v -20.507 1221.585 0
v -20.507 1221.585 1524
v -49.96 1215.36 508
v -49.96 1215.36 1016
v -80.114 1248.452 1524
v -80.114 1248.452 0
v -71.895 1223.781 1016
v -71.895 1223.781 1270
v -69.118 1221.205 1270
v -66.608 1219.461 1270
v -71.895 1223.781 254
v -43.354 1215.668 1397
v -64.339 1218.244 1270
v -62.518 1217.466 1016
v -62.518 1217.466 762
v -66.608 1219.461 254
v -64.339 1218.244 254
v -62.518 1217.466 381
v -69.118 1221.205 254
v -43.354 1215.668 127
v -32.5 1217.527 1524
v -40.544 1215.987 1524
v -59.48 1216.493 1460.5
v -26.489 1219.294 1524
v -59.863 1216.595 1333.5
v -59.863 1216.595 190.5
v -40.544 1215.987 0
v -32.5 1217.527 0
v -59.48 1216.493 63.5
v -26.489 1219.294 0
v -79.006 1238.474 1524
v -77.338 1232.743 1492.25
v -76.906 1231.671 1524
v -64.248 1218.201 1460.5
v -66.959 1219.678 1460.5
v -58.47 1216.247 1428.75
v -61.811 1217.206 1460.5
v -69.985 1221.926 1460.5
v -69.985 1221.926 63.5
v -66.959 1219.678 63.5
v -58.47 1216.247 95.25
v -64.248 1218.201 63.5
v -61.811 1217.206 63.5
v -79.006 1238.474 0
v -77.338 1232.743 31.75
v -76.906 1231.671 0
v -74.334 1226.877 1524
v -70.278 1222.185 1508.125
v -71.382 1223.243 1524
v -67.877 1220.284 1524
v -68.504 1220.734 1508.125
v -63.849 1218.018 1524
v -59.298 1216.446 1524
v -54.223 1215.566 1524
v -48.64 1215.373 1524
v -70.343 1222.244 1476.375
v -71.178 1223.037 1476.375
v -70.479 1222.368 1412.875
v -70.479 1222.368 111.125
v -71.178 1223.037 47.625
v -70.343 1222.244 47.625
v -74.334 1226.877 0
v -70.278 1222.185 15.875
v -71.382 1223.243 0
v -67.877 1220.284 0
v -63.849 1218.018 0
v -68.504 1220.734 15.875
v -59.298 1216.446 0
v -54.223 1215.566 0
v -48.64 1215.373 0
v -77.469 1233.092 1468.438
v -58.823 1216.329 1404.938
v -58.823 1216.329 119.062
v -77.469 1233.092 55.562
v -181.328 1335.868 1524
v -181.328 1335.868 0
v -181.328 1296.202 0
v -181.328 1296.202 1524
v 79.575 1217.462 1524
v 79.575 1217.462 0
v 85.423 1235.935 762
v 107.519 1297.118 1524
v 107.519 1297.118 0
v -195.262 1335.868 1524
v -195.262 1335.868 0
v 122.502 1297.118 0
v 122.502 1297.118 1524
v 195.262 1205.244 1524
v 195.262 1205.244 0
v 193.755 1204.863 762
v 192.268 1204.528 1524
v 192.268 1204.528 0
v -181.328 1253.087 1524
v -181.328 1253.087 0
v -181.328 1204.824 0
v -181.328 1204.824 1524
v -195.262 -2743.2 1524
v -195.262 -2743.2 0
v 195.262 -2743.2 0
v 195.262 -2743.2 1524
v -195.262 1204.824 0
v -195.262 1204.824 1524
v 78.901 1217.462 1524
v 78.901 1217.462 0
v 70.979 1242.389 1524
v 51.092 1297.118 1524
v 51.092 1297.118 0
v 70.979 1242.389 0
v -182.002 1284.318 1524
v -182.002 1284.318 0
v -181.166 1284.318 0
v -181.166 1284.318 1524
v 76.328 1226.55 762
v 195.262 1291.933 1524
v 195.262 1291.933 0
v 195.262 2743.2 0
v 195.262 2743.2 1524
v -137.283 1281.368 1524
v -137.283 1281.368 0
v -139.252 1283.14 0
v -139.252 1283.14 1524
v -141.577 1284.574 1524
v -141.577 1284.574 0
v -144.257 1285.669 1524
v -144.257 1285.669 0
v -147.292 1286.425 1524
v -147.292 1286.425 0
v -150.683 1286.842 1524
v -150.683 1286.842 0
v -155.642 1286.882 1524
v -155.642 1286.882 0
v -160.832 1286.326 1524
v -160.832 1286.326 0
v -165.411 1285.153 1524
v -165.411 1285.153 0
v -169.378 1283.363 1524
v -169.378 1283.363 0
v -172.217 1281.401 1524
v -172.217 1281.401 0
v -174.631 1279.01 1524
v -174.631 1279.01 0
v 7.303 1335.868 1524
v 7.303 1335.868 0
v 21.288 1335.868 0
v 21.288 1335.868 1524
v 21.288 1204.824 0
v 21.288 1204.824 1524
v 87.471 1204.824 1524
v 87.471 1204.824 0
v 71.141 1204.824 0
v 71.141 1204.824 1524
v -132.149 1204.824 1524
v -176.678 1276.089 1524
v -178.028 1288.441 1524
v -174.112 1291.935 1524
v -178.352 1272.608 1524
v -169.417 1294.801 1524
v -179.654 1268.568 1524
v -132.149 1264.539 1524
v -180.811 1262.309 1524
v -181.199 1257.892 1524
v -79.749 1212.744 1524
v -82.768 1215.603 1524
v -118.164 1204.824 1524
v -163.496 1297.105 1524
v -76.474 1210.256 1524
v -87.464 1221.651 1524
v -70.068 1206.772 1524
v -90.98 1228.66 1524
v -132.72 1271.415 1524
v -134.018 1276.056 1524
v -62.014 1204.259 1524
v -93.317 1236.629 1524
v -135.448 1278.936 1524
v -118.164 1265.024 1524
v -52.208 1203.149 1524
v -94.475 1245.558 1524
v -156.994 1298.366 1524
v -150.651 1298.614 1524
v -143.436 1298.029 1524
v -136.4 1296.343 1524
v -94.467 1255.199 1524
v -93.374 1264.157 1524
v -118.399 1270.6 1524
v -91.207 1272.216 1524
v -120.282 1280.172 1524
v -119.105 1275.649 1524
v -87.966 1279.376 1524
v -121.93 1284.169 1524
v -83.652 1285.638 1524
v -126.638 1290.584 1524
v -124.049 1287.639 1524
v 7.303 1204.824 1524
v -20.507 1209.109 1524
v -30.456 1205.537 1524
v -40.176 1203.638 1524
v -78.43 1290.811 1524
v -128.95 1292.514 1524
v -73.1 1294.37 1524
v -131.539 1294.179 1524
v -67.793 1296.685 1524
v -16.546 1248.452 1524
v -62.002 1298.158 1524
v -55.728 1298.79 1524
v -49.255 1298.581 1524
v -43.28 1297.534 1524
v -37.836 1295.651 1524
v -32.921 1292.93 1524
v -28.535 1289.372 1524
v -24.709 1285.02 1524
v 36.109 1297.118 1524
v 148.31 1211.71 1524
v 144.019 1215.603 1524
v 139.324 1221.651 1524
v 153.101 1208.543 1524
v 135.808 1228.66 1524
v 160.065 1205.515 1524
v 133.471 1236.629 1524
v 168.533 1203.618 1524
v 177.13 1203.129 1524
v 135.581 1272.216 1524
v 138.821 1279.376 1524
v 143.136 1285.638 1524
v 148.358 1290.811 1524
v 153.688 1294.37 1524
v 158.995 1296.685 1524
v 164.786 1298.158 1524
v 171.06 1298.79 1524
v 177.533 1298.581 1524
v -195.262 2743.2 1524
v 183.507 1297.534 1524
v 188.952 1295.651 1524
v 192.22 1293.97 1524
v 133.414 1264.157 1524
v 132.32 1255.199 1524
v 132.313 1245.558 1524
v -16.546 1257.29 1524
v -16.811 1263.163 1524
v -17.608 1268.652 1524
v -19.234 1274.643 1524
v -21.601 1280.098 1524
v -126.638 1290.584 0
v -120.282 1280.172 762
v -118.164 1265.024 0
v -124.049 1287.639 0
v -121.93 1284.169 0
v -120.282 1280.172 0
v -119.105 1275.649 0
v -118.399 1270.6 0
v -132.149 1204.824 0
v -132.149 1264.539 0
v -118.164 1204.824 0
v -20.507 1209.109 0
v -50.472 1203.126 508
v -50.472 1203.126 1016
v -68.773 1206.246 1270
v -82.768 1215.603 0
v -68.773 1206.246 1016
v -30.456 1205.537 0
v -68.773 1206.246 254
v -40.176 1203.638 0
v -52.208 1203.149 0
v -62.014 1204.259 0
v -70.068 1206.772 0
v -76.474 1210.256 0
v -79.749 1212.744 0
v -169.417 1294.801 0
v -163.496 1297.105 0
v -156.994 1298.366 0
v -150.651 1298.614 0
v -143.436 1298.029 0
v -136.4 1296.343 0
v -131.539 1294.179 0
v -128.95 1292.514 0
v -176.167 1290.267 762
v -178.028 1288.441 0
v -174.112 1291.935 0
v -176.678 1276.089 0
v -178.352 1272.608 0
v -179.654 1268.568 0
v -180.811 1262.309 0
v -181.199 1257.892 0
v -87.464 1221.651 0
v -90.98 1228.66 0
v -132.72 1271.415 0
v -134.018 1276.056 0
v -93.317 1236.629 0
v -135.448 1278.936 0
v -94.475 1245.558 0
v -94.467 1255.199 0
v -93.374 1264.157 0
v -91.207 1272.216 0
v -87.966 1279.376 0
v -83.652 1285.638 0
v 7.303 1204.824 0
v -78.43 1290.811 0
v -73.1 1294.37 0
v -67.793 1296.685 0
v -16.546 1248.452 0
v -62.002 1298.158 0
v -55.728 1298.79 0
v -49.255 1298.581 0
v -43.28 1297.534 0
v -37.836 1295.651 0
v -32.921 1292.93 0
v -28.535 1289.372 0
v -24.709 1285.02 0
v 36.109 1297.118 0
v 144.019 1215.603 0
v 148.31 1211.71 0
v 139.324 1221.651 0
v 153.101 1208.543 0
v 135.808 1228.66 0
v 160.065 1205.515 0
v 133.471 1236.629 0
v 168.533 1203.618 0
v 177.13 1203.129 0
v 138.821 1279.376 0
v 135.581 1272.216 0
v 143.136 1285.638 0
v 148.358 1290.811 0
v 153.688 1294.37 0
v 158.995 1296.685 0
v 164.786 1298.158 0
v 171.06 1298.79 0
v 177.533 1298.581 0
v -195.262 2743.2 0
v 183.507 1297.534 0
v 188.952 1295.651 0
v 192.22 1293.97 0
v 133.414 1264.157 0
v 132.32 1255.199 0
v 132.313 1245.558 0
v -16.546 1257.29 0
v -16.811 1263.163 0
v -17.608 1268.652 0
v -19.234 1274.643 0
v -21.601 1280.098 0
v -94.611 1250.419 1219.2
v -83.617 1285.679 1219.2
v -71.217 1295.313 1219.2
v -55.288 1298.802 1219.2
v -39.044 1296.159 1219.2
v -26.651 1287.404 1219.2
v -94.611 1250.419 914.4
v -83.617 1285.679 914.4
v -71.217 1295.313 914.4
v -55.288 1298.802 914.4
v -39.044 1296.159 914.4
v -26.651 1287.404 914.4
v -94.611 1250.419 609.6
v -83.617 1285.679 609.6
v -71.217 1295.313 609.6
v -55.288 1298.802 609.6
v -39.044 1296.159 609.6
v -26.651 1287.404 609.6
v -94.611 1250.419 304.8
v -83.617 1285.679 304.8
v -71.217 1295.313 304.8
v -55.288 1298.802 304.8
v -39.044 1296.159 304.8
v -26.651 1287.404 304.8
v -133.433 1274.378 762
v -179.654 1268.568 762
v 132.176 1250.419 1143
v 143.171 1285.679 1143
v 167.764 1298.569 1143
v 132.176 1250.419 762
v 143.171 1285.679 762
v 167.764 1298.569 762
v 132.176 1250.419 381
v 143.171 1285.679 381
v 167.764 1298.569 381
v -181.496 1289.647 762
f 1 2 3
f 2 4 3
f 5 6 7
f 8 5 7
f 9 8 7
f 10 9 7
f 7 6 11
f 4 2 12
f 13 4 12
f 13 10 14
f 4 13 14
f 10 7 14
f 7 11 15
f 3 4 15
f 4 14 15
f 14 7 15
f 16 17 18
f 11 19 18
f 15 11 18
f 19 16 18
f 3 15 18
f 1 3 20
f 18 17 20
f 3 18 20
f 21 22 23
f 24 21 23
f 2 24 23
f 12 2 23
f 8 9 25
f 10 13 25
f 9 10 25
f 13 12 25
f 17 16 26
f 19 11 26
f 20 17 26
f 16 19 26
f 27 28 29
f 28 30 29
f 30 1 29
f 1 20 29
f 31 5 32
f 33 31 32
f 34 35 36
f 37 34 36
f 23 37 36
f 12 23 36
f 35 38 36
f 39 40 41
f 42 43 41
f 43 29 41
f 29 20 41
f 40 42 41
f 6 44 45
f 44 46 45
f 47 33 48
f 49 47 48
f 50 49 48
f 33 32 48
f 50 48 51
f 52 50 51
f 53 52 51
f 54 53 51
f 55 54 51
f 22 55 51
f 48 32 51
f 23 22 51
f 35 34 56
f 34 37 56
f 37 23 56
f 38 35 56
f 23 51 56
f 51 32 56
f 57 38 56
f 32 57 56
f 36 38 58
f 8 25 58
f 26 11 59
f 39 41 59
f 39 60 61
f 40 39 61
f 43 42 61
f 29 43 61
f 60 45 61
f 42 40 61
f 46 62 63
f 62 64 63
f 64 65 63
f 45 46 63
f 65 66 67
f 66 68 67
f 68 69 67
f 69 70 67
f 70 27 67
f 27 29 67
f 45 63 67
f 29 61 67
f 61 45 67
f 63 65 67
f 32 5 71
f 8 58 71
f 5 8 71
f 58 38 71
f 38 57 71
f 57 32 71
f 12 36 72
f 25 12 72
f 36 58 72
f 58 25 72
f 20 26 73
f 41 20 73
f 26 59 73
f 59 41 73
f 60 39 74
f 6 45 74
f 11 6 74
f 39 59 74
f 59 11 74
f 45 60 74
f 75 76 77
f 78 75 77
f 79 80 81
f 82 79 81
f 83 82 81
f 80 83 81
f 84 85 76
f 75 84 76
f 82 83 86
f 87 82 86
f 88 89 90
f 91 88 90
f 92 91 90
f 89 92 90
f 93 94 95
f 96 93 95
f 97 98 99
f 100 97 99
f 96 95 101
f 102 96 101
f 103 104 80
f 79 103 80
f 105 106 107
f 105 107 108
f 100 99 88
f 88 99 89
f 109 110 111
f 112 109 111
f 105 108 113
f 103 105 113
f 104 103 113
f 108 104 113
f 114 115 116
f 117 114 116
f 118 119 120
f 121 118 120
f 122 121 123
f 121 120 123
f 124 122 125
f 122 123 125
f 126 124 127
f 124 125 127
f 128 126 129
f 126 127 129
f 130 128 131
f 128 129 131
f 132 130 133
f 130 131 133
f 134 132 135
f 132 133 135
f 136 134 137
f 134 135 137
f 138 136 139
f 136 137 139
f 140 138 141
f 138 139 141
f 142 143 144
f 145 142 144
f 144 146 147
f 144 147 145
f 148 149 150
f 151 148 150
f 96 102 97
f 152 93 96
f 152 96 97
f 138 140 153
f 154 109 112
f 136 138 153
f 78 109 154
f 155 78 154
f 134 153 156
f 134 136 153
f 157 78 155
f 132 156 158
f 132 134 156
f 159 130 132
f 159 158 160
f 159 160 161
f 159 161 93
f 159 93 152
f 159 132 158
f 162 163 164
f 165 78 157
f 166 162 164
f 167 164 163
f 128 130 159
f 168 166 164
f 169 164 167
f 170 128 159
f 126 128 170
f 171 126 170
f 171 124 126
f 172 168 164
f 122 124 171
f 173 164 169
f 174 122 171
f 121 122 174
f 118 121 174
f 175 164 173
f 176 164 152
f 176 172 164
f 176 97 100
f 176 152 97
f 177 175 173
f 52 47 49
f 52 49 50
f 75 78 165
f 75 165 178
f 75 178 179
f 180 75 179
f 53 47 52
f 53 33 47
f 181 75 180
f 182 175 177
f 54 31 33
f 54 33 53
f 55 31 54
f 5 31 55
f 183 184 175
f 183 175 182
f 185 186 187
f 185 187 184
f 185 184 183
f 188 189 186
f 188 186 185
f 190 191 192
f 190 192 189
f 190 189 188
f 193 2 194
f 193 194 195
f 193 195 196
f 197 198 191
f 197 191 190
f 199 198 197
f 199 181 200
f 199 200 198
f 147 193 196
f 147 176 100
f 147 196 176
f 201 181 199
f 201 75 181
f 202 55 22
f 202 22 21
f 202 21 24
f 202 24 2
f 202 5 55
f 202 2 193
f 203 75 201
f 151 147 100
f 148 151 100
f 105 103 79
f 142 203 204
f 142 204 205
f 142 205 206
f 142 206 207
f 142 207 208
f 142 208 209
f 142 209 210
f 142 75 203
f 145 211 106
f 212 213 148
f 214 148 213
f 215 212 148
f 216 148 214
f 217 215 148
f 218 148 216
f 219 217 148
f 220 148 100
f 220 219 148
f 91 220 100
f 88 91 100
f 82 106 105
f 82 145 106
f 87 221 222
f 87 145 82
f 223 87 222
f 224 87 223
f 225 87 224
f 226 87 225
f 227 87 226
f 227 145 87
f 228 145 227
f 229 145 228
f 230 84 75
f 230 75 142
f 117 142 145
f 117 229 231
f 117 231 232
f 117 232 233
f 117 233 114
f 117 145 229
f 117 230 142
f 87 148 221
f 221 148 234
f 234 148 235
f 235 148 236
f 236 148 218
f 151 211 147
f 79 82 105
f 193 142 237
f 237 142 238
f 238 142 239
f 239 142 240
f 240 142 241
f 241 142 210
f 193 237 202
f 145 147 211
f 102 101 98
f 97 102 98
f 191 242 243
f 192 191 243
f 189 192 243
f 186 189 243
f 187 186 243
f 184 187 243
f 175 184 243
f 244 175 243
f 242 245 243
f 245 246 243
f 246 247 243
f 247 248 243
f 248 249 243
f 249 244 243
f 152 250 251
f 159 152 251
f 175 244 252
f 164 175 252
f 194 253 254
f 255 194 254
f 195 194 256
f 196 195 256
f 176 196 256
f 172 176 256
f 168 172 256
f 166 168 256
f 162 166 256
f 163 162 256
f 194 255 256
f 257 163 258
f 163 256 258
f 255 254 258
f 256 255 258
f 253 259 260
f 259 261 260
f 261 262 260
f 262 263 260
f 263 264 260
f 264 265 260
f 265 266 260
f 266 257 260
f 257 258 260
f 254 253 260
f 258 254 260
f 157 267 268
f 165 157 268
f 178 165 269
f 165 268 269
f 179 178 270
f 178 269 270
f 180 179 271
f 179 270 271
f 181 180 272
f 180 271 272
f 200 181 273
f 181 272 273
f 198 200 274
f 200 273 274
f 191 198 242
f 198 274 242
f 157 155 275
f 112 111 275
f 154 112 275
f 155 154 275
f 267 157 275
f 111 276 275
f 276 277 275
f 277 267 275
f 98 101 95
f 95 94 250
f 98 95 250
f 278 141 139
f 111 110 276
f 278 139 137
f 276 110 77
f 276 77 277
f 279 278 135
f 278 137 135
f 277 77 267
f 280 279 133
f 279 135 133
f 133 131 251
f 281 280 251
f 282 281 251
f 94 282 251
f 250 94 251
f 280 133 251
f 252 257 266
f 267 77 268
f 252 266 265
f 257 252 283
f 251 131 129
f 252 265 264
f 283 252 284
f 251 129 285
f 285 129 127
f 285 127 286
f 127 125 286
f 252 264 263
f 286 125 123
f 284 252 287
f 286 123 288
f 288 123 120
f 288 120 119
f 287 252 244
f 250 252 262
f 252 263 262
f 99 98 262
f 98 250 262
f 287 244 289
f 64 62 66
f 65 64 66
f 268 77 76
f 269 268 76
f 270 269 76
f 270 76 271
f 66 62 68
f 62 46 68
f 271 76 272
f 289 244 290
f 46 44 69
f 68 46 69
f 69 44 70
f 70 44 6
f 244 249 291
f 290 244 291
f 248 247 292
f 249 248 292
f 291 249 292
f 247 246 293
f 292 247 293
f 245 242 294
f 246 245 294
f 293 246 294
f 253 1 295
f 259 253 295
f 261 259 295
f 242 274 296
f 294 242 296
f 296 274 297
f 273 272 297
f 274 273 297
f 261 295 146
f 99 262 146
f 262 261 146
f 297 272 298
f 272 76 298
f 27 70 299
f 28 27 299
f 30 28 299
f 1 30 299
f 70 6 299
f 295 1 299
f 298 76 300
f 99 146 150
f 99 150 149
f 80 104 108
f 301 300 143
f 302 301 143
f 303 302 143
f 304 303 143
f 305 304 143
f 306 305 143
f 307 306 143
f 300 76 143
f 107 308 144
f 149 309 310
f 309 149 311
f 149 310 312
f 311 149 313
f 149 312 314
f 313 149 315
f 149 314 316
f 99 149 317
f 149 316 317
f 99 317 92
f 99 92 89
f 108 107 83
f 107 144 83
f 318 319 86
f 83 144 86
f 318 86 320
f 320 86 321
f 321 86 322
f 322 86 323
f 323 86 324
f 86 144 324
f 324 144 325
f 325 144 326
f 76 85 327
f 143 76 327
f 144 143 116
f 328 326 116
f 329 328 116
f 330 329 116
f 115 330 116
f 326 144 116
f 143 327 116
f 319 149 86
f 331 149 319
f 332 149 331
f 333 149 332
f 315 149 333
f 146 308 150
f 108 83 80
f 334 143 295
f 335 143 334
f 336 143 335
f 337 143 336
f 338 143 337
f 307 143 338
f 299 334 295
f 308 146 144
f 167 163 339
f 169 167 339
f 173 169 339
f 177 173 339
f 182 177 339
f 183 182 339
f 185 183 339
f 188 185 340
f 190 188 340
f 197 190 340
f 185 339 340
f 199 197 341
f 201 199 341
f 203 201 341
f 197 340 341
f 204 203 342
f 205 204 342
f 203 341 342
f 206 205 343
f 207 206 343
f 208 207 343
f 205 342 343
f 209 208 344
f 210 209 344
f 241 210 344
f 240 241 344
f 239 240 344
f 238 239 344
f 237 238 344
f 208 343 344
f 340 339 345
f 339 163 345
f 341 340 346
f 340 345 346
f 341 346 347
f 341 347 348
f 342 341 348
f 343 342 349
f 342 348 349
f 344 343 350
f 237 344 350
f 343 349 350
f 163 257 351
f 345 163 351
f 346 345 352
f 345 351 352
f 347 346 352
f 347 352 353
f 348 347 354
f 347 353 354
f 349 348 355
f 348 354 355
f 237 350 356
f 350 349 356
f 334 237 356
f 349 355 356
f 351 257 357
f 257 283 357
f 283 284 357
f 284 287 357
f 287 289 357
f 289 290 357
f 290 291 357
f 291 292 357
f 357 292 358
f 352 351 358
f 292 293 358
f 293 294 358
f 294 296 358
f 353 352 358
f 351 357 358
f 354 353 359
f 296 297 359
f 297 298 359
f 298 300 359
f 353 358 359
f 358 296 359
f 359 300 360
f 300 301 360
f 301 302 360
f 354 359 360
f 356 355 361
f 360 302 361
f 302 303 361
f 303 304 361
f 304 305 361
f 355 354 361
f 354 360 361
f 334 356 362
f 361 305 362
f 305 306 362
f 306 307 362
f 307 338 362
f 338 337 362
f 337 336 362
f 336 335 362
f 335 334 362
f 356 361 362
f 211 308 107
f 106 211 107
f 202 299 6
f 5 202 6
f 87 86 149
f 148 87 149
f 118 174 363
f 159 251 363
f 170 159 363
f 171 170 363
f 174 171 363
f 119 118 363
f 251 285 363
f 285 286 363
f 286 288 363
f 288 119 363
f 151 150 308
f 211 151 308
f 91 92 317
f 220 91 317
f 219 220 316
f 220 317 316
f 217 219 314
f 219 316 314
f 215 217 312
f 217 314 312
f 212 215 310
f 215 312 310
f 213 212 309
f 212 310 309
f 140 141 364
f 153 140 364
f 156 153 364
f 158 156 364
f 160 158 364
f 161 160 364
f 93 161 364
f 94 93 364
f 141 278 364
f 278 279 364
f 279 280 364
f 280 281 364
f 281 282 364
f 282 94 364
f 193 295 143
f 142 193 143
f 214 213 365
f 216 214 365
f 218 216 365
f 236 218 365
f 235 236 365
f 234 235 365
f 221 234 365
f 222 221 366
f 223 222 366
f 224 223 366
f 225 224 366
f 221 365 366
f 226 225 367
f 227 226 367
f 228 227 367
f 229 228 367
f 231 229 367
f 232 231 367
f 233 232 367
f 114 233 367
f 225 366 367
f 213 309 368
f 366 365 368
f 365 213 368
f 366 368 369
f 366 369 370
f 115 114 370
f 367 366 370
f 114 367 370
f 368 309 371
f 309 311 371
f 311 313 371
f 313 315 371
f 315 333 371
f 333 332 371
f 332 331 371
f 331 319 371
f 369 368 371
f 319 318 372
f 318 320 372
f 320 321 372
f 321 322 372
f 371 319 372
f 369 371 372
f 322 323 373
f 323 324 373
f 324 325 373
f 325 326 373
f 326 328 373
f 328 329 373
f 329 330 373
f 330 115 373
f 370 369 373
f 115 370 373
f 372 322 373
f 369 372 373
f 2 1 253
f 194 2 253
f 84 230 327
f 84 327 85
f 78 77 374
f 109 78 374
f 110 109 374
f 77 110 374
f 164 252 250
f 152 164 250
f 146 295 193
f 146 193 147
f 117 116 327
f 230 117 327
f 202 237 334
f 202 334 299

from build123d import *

# Parameters (mm, degrees)
F0_W     = 13.9856069313
F0_H     = 131.0443285297
F1_DEPTH = 1524


with BuildPart() as f1:
    # F0 (on Top) → F1 (new body)
    with BuildSketch(Plane.XY):
        with BuildLine():
            Line((195.2625, 1291.9325532706), (195.2625, 2743.2))
            Line((195.2625, 2743.2), (-195.2625, 2743.2))
            Line((-195.2625, 2743.2), (-195.2625, 1335.8684377216))
            Line((-195.2625, 1335.8684377216), (-181.3278401556, 1335.8684377216))
            Line((-181.3278401556, 1335.8684377216), (-181.3278401556, 1296.2021305869))
            add(Edge.make_bspline(
                [(-181.3278401556, 1296.2021305869), (-181.3278401556, 1289.0341701944), (-182.0015206436, 1284.3184067783)],
                knots=[0, 0, 0, 1, 1, 1], degree=2))
            Line((-182.0015206436, 1284.3184067783), (-181.1661568385, 1284.3184067783))
            add(Edge.make_bspline(
                [(-181.1661568385, 1284.3184067783), (-177.0432322518, 1290.9743699999), (-169.4171691274, 1294.8008751719)],
                knots=[0, 0, 0, 1, 1, 1], degree=2))
            add(Edge.make_bspline(
                [(-169.4171691274, 1294.8008751719), (-161.791106003, 1298.6273803438), (-152.0362125365, 1298.6273803438)],
                knots=[0, 0, 0, 1, 1, 1], degree=2))
            add(Edge.make_bspline(
                [(-152.0362125365, 1298.6273803438), (-135.1133586774, 1298.6273803438), (-126.6384581381, 1290.5836353168)],
                knots=[0, 0, 0, 1, 1, 1], degree=2))
            add(Edge.make_bspline(
                [(-126.6384581381, 1290.5836353168), (-118.1635575988, 1282.5398902899), (-118.1635575988, 1265.0241976013)],
                knots=[0, 0, 0, 1, 1, 1], degree=2))
            Line((-118.1635575988, 1265.0241976013), (-118.1635575988, 1204.8241091918))
            Line((-118.1635575988, 1204.8241091918), (-132.1491645301, 1204.8241091918))
            Line((-132.1491645301, 1204.8241091918), (-132.1491645301, 1264.53914765))
            add(Edge.make_bspline(
                [(-132.1491645301, 1264.53914765), (-132.1491645301, 1275.8030854097), (-137.2826098488, 1281.3676862407)],
                knots=[0, 0, 0, 1, 1, 1], degree=2))
            add(Edge.make_bspline(
                [(-137.2826098488, 1281.3676862407), (-142.4160551675, 1286.9322870718), (-153.3835735125, 1286.9322870718)],
                knots=[0, 0, 0, 1, 1, 1], degree=2))
            add(Edge.make_bspline(
                [(-153.3835735125, 1286.9322870718), (-167.9350720538, 1286.9322870718), (-174.6314561047, 1279.0098045327)],
                knots=[0, 0, 0, 1, 1, 1], degree=2))
            add(Edge.make_bspline(
                [(-174.6314561047, 1279.0098045327), (-181.3278401556, 1271.0873219935), (-181.3278401556, 1253.0865793536)],
                knots=[0, 0, 0, 1, 1, 1], degree=2))
            Line((-181.3278401556, 1253.0865793536), (-181.3278401556, 1204.8241091918))
            Line((-181.3278401556, 1204.8241091918), (-195.2625, 1204.8241091918))
            Line((-195.2625, 1204.8241091918), (-195.2625, -2743.2))
            Line((-195.2625, -2743.2), (195.2625, -2743.2))
            Line((195.2625, -2743.2), (195.2625, 1205.2435765716))
            add(Edge.make_bspline(
                [(195.2625, 1205.2435765716), (193.7452301259, 1204.8411370421), (192.2684112811, 1204.5276897771)],
                knots=[0.7763096851, 0.7763096851, 0.7763096851, 1, 1, 1], degree=2))
            add(Edge.make_bspline(
                [(192.2684112811, 1204.5276897771), (185.6663424985, 1203.126434362), (176.3156573247, 1203.126434362)],
                knots=[0, 0, 0, 1, 1, 1], degree=2))
            add(Edge.make_bspline(
                [(176.3156573247, 1203.126434362), (155.8627177084, 1203.126434362), (144.019414729, 1215.6029970002)],
                knots=[0, 0, 0, 1, 1, 1], degree=2))
            add(Edge.make_bspline(
                [(144.019414729, 1215.6029970002), (132.1761117496, 1228.0795596383), (132.1761117496, 1250.2032268649)],
                knots=[0, 0, 0, 1, 1, 1], degree=2))
            add(Edge.make_bspline(
                [(132.1761117496, 1250.2032268649), (132.1761117496, 1272.5424718477), (143.1705773141, 1285.6792413641)],
                knots=[0, 0, 0, 1, 1, 1], degree=2))
            add(Edge.make_bspline(
                [(143.1705773141, 1285.6792413641), (154.1650428786, 1298.8160108805), (172.7047299089, 1298.8160108805)],
                knots=[0, 0, 0, 1, 1, 1], degree=2))
            add(Edge.make_bspline(
                [(172.7047299089, 1298.8160108805), (186.1616157094, 1298.8160108805), (195.2625, 1291.9325532706)],
                knots=[0, 0, 0, 0.7766397836, 0.7766397836, 0.7766397836], degree=2))
        make_face()
        with BuildLine():
            add(Edge.make_bspline(
                [(-34.5193882062, 1204.5276897771), (-41.1214569888, 1203.126434362), (-50.4721421625, 1203.126434362)],
                knots=[0, 0, 0, 1, 1, 1], degree=2))
            add(Edge.make_bspline(
                [(-50.4721421625, 1203.126434362), (-70.9250817788, 1203.126434362), (-82.7683847582, 1215.6029970002)],
                knots=[0, 0, 0, 1, 1, 1], degree=2))
            add(Edge.make_bspline(
                [(-82.7683847582, 1215.6029970002), (-94.6116877376, 1228.0795596383), (-94.6116877376, 1250.2032268649)],
                knots=[0, 0, 0, 1, 1, 1], degree=2))
            add(Edge.make_bspline(
                [(-94.6116877376, 1250.2032268649), (-94.6116877376, 1272.5424718477), (-83.6172221731, 1285.6792413641)],
                knots=[0, 0, 0, 1, 1, 1], degree=2))
            add(Edge.make_bspline(
                [(-83.6172221731, 1285.6792413641), (-72.6227566086, 1298.8160108805), (-54.0830695783, 1298.8160108805)],
                knots=[0, 0, 0, 1, 1, 1], degree=2))
            add(Edge.make_bspline(
                [(-54.0830695783, 1298.8160108805), (-36.7560074264, 1298.8160108805), (-26.6508001061, 1287.4038634134)],
                knots=[0, 0, 0, 1, 1, 1], degree=2))
            add(Edge.make_bspline(
                [(-26.6508001061, 1287.4038634134), (-16.5455927858, 1275.9917159463), (-16.5455927858, 1257.2903455989)],
                knots=[0, 0, 0, 1, 1, 1], degree=2))
            Line((-16.5455927858, 1257.2903455989), (-16.5455927858, 1248.451657596))
            Line((-16.5455927858, 1248.451657596), (-80.1140836354, 1248.451657596))
            add(Edge.make_bspline(
                [(-80.1140836354, 1248.451657596), (-79.6829281231, 1232.202484225), (-71.8951816815, 1223.7814781247)],
                knots=[0, 0, 0, 1, 1, 1], degree=2))
            add(Edge.make_bspline(
                [(-71.8951816815, 1223.7814781247), (-64.10743524, 1215.3604720245), (-49.9601449916, 1215.3604720245)],
                knots=[0, 0, 0, 1, 1, 1], degree=2))
            add(Edge.make_bspline(
                [(-49.9601449916, 1215.3604720245), (-35.0583325966, 1215.3604720245), (-20.5068340553, 1221.5852797338)],
                knots=[0, 0, 0, 1, 1, 1], degree=2))
            Line((-20.5068340553, 1221.5852797338), (-20.5068340553, 1209.1087170956))
            add(Edge.make_bspline(
                [(-20.5068340553, 1209.1087170956), (-27.9173194236, 1205.9289451922), (-34.5193882062, 1204.5276897771)],
                knots=[0, 0, 0, 1, 1, 1], degree=2))
        make_face(mode=Mode.SUBTRACT)
        with Locations((14.2954999558, 1270.3462734567)):
            Rectangle(F0_W, F0_H, mode=Mode.SUBTRACT)
        with BuildLine():
            Line((87.4706745646, 1204.8241091918), (71.140659535, 1204.8241091918))
            Line((71.140659535, 1204.8241091918), (36.1092741579, 1297.1183360506))
            Line((36.1092741579, 1297.1183360506), (51.0919282115, 1297.1183360506))
            Line((51.0919282115, 1297.1183360506), (70.9789762178, 1242.3885332039))
            add(Edge.make_bspline(
                [(70.9789762178, 1242.3885332039), (77.715781098, 1223.1751656855), (78.901458757, 1217.4623551471)],
                knots=[0, 0, 0, 1, 1, 1], degree=2))
            Line((78.901458757, 1217.4623551471), (79.575139245, 1217.4623551471))
            add(Edge.make_bspline(
                [(79.575139245, 1217.4623551471), (80.4913447087, 1221.908646368), (85.422685881, 1235.9346741286)],
                knots=[0, 0, 0, 1, 1, 1], degree=2))
            add(Edge.make_bspline(
                [(85.422685881, 1235.9346741286), (90.3540270533, 1249.9607018892), (107.5194058881, 1297.1183360506)],
                knots=[0, 0, 0, 1, 1, 1], degree=2))
            Line((107.5194058881, 1297.1183360506), (122.5020599416, 1297.1183360506))
            Line((122.5020599416, 1297.1183360506), (87.4706745646, 1204.8241091918))
        make_face(mode=Mode.SUBTRACT)
    extrude(amount=F1_DEPTH)


solid = f1.part
